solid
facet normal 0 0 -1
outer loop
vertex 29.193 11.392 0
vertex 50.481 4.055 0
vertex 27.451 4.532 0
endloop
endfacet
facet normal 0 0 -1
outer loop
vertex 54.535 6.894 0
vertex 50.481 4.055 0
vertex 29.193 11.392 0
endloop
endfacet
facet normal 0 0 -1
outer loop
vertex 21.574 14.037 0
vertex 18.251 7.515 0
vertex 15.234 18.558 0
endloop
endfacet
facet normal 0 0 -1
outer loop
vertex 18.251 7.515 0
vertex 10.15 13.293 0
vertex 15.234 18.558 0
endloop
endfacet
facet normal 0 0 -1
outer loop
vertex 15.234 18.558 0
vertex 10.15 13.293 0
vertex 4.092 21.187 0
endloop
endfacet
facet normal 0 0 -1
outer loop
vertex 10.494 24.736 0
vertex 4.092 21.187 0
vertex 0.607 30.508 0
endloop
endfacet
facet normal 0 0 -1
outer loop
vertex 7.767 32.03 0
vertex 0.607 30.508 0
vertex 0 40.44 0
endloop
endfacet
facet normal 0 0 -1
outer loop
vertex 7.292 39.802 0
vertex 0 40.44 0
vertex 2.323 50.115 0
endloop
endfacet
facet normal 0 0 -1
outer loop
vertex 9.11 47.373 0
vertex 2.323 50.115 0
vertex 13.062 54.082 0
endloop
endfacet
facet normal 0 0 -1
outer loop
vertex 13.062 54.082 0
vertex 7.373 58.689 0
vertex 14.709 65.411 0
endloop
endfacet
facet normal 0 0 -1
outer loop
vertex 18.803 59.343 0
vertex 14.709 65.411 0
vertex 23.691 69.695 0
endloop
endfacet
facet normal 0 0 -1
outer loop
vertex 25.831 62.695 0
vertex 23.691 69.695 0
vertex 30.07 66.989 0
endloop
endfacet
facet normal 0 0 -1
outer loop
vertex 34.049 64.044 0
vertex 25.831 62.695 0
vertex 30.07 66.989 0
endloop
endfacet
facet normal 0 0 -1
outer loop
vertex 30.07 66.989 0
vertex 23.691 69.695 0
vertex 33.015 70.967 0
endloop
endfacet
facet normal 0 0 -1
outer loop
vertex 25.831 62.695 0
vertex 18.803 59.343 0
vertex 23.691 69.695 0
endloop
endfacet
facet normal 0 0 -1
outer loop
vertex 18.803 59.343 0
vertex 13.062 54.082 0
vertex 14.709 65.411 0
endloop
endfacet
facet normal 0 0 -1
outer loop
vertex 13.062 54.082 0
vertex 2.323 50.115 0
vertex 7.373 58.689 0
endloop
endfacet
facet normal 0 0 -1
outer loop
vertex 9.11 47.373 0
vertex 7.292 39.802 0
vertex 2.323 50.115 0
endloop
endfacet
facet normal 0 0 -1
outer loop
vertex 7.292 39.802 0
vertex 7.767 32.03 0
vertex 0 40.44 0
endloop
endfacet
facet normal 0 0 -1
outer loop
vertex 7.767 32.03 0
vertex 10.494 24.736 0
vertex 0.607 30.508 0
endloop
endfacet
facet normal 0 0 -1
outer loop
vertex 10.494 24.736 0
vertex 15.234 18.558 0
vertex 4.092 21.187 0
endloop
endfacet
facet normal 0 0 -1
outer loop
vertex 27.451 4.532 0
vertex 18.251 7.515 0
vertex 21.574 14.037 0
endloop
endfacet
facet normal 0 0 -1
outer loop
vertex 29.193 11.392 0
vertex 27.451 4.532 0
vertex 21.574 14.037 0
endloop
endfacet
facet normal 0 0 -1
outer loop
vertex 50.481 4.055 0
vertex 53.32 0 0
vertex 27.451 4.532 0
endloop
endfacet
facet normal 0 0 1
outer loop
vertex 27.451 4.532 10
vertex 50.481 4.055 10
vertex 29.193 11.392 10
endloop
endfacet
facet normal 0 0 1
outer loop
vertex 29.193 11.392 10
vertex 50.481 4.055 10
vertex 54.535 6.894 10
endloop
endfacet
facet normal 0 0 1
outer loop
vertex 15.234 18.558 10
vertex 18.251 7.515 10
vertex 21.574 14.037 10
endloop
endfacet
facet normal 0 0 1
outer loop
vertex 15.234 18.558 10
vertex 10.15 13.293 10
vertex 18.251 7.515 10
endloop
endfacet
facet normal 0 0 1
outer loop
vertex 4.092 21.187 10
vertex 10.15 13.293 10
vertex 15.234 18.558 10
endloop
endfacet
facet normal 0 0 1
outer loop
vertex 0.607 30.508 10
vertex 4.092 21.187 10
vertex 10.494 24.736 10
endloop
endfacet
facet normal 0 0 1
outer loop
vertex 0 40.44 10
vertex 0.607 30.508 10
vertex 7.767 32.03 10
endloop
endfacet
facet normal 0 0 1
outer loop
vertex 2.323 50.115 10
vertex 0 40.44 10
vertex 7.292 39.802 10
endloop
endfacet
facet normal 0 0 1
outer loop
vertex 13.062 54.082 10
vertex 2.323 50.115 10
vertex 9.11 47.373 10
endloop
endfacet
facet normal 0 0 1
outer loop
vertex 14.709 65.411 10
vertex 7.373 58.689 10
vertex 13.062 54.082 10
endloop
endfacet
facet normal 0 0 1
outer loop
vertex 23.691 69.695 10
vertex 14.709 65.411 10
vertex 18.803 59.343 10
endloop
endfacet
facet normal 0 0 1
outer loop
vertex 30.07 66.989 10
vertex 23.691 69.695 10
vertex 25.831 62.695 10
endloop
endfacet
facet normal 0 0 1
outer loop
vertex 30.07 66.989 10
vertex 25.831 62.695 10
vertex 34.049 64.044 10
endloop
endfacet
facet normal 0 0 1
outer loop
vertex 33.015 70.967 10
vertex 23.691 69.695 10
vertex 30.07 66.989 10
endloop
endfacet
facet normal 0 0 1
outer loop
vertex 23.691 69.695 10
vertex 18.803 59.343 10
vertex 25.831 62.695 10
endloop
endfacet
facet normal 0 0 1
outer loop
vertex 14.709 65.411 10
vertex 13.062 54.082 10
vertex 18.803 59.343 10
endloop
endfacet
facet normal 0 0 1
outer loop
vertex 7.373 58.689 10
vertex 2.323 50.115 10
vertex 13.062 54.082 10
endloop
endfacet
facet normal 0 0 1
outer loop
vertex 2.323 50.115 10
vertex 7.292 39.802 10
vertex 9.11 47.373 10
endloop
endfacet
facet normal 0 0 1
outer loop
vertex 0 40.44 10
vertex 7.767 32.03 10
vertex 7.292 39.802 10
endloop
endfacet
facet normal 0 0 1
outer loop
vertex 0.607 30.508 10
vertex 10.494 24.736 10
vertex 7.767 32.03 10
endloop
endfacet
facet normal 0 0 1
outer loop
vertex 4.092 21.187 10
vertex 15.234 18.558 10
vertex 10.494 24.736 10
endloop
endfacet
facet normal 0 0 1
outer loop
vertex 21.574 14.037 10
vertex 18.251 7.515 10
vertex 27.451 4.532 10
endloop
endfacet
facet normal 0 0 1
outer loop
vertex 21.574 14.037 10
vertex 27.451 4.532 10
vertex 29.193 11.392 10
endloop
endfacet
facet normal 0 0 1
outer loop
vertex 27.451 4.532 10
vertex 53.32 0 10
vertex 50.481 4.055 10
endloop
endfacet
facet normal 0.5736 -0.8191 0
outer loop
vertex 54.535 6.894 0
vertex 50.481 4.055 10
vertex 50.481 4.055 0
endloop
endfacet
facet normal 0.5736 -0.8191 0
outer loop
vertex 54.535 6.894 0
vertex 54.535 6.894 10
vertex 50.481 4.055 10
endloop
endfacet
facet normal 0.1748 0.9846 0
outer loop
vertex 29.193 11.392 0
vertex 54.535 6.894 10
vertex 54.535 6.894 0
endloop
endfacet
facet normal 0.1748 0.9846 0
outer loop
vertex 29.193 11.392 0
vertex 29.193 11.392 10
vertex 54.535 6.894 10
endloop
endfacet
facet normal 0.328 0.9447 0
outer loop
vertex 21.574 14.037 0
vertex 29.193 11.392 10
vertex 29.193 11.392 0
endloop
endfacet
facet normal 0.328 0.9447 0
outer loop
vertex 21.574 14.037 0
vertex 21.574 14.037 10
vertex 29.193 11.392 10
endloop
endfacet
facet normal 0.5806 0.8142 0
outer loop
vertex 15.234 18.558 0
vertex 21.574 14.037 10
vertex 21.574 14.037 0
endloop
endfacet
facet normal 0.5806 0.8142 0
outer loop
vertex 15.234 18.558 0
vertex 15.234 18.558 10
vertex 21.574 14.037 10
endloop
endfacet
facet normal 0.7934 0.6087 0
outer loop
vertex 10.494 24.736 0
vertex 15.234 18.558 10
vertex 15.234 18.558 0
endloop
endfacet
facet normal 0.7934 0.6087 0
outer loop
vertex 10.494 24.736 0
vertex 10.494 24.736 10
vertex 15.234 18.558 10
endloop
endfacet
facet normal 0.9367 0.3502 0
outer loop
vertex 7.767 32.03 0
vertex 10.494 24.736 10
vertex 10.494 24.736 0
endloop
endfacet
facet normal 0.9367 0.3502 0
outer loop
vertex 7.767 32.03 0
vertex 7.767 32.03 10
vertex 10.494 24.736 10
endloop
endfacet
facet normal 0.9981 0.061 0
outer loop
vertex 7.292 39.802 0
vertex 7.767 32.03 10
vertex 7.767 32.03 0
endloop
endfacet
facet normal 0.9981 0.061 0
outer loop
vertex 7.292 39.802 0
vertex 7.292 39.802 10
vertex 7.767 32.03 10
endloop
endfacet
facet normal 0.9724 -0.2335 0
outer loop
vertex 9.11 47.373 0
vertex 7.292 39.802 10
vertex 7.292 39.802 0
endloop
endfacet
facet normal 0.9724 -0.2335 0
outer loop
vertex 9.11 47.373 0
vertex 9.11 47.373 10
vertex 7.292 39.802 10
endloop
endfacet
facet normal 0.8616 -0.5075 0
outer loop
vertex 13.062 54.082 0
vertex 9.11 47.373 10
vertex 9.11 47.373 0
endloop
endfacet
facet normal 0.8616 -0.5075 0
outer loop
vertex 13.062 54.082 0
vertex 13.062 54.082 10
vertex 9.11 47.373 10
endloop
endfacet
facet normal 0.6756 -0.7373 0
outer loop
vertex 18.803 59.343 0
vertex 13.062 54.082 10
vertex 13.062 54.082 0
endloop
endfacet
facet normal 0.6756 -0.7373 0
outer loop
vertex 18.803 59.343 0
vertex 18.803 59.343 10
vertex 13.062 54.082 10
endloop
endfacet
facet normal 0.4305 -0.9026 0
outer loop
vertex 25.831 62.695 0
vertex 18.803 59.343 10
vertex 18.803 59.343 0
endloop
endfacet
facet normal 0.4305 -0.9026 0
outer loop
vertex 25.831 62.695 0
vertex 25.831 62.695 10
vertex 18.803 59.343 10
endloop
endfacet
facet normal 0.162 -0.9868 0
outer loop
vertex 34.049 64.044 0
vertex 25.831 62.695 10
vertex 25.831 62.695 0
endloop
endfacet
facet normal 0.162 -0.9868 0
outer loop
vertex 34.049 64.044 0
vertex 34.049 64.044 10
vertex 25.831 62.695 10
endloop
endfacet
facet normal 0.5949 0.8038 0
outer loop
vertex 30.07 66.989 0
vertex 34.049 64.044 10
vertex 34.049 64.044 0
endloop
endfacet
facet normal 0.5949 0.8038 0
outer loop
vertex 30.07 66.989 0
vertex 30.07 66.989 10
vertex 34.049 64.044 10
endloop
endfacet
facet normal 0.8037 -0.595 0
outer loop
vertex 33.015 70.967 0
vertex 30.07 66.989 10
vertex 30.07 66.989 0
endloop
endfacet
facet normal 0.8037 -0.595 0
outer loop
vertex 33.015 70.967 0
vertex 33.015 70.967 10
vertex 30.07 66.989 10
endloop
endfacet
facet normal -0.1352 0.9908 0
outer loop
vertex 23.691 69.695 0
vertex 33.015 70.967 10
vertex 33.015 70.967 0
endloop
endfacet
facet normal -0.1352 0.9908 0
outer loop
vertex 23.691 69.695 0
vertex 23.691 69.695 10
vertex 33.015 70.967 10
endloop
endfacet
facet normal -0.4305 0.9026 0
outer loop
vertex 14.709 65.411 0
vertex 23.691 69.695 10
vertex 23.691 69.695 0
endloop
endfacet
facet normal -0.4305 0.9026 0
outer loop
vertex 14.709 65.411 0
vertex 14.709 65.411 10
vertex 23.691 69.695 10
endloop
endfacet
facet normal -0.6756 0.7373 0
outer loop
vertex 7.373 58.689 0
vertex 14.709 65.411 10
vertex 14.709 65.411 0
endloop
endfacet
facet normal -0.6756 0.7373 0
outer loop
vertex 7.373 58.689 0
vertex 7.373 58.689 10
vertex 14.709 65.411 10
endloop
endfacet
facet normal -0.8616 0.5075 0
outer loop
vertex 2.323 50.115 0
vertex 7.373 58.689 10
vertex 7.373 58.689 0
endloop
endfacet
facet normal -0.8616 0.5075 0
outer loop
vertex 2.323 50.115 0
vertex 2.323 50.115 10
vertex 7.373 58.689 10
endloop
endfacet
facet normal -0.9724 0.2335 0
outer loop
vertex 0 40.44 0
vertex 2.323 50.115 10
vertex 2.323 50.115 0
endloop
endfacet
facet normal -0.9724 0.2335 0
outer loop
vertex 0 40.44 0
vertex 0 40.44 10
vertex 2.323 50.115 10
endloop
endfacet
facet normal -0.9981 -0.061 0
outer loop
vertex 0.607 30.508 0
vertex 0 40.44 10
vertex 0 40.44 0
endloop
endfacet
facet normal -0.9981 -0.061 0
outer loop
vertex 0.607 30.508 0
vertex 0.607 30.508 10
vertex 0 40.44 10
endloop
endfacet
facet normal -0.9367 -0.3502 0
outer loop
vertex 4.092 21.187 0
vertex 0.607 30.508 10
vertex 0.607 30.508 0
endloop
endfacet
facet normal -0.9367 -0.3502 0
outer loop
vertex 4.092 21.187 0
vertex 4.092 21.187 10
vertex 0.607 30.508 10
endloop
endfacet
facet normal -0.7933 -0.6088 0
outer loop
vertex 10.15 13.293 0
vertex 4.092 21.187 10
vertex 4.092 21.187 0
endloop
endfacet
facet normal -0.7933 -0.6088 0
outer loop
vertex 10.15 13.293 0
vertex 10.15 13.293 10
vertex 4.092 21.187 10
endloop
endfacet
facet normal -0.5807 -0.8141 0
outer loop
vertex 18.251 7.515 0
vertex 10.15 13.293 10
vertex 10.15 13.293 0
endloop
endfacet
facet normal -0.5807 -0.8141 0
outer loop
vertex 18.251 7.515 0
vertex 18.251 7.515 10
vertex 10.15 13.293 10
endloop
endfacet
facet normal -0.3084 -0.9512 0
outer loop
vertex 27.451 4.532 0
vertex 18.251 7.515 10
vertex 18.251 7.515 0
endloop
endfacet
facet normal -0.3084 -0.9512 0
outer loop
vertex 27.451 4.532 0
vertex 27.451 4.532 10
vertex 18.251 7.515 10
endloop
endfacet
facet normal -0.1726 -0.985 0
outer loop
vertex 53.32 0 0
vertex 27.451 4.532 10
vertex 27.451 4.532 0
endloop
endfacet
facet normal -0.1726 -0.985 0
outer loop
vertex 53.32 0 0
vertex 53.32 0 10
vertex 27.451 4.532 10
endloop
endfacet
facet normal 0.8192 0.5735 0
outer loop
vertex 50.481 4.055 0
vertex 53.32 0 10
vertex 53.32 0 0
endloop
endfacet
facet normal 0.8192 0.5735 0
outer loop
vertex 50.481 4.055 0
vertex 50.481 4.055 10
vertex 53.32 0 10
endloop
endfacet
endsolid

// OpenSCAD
$fn = 32;

// ----------------------------------------------------------------------
// Hook plate: curl radius 30 mm over 170 degrees, 7 mm thick band
// ----------------------------------------------------------------------

// --- parameters (mm) ---
profile_height = 10;      // extrusion height
profile_points = 26;      // points of the closed outline

profile = [[30.07, 66.989], [33.015, 70.967], [23.691, 69.695], [14.709, 65.411], [7.373, 58.689], [2.323, 50.115], [0, 40.44], [0.607, 30.508], [4.092, 21.187], [10.15, 13.293], [18.251, 7.515], [27.451, 4.532], [53.32, 0], [50.481, 4.055], [54.535, 6.894], [29.193, 11.392], [21.574, 14.037], [15.234, 18.558], [10.494, 24.736], [7.767, 32.03], [7.292, 39.802], [9.11, 47.373], [13.062, 54.082], [18.803, 59.343], [25.831, 62.695], [34.049, 64.044]];  // single closed polygon, 26 points, counter clockwise

// --- the one profile operation ---
linear_extrude(height = profile_height) polygon(points = profile);
